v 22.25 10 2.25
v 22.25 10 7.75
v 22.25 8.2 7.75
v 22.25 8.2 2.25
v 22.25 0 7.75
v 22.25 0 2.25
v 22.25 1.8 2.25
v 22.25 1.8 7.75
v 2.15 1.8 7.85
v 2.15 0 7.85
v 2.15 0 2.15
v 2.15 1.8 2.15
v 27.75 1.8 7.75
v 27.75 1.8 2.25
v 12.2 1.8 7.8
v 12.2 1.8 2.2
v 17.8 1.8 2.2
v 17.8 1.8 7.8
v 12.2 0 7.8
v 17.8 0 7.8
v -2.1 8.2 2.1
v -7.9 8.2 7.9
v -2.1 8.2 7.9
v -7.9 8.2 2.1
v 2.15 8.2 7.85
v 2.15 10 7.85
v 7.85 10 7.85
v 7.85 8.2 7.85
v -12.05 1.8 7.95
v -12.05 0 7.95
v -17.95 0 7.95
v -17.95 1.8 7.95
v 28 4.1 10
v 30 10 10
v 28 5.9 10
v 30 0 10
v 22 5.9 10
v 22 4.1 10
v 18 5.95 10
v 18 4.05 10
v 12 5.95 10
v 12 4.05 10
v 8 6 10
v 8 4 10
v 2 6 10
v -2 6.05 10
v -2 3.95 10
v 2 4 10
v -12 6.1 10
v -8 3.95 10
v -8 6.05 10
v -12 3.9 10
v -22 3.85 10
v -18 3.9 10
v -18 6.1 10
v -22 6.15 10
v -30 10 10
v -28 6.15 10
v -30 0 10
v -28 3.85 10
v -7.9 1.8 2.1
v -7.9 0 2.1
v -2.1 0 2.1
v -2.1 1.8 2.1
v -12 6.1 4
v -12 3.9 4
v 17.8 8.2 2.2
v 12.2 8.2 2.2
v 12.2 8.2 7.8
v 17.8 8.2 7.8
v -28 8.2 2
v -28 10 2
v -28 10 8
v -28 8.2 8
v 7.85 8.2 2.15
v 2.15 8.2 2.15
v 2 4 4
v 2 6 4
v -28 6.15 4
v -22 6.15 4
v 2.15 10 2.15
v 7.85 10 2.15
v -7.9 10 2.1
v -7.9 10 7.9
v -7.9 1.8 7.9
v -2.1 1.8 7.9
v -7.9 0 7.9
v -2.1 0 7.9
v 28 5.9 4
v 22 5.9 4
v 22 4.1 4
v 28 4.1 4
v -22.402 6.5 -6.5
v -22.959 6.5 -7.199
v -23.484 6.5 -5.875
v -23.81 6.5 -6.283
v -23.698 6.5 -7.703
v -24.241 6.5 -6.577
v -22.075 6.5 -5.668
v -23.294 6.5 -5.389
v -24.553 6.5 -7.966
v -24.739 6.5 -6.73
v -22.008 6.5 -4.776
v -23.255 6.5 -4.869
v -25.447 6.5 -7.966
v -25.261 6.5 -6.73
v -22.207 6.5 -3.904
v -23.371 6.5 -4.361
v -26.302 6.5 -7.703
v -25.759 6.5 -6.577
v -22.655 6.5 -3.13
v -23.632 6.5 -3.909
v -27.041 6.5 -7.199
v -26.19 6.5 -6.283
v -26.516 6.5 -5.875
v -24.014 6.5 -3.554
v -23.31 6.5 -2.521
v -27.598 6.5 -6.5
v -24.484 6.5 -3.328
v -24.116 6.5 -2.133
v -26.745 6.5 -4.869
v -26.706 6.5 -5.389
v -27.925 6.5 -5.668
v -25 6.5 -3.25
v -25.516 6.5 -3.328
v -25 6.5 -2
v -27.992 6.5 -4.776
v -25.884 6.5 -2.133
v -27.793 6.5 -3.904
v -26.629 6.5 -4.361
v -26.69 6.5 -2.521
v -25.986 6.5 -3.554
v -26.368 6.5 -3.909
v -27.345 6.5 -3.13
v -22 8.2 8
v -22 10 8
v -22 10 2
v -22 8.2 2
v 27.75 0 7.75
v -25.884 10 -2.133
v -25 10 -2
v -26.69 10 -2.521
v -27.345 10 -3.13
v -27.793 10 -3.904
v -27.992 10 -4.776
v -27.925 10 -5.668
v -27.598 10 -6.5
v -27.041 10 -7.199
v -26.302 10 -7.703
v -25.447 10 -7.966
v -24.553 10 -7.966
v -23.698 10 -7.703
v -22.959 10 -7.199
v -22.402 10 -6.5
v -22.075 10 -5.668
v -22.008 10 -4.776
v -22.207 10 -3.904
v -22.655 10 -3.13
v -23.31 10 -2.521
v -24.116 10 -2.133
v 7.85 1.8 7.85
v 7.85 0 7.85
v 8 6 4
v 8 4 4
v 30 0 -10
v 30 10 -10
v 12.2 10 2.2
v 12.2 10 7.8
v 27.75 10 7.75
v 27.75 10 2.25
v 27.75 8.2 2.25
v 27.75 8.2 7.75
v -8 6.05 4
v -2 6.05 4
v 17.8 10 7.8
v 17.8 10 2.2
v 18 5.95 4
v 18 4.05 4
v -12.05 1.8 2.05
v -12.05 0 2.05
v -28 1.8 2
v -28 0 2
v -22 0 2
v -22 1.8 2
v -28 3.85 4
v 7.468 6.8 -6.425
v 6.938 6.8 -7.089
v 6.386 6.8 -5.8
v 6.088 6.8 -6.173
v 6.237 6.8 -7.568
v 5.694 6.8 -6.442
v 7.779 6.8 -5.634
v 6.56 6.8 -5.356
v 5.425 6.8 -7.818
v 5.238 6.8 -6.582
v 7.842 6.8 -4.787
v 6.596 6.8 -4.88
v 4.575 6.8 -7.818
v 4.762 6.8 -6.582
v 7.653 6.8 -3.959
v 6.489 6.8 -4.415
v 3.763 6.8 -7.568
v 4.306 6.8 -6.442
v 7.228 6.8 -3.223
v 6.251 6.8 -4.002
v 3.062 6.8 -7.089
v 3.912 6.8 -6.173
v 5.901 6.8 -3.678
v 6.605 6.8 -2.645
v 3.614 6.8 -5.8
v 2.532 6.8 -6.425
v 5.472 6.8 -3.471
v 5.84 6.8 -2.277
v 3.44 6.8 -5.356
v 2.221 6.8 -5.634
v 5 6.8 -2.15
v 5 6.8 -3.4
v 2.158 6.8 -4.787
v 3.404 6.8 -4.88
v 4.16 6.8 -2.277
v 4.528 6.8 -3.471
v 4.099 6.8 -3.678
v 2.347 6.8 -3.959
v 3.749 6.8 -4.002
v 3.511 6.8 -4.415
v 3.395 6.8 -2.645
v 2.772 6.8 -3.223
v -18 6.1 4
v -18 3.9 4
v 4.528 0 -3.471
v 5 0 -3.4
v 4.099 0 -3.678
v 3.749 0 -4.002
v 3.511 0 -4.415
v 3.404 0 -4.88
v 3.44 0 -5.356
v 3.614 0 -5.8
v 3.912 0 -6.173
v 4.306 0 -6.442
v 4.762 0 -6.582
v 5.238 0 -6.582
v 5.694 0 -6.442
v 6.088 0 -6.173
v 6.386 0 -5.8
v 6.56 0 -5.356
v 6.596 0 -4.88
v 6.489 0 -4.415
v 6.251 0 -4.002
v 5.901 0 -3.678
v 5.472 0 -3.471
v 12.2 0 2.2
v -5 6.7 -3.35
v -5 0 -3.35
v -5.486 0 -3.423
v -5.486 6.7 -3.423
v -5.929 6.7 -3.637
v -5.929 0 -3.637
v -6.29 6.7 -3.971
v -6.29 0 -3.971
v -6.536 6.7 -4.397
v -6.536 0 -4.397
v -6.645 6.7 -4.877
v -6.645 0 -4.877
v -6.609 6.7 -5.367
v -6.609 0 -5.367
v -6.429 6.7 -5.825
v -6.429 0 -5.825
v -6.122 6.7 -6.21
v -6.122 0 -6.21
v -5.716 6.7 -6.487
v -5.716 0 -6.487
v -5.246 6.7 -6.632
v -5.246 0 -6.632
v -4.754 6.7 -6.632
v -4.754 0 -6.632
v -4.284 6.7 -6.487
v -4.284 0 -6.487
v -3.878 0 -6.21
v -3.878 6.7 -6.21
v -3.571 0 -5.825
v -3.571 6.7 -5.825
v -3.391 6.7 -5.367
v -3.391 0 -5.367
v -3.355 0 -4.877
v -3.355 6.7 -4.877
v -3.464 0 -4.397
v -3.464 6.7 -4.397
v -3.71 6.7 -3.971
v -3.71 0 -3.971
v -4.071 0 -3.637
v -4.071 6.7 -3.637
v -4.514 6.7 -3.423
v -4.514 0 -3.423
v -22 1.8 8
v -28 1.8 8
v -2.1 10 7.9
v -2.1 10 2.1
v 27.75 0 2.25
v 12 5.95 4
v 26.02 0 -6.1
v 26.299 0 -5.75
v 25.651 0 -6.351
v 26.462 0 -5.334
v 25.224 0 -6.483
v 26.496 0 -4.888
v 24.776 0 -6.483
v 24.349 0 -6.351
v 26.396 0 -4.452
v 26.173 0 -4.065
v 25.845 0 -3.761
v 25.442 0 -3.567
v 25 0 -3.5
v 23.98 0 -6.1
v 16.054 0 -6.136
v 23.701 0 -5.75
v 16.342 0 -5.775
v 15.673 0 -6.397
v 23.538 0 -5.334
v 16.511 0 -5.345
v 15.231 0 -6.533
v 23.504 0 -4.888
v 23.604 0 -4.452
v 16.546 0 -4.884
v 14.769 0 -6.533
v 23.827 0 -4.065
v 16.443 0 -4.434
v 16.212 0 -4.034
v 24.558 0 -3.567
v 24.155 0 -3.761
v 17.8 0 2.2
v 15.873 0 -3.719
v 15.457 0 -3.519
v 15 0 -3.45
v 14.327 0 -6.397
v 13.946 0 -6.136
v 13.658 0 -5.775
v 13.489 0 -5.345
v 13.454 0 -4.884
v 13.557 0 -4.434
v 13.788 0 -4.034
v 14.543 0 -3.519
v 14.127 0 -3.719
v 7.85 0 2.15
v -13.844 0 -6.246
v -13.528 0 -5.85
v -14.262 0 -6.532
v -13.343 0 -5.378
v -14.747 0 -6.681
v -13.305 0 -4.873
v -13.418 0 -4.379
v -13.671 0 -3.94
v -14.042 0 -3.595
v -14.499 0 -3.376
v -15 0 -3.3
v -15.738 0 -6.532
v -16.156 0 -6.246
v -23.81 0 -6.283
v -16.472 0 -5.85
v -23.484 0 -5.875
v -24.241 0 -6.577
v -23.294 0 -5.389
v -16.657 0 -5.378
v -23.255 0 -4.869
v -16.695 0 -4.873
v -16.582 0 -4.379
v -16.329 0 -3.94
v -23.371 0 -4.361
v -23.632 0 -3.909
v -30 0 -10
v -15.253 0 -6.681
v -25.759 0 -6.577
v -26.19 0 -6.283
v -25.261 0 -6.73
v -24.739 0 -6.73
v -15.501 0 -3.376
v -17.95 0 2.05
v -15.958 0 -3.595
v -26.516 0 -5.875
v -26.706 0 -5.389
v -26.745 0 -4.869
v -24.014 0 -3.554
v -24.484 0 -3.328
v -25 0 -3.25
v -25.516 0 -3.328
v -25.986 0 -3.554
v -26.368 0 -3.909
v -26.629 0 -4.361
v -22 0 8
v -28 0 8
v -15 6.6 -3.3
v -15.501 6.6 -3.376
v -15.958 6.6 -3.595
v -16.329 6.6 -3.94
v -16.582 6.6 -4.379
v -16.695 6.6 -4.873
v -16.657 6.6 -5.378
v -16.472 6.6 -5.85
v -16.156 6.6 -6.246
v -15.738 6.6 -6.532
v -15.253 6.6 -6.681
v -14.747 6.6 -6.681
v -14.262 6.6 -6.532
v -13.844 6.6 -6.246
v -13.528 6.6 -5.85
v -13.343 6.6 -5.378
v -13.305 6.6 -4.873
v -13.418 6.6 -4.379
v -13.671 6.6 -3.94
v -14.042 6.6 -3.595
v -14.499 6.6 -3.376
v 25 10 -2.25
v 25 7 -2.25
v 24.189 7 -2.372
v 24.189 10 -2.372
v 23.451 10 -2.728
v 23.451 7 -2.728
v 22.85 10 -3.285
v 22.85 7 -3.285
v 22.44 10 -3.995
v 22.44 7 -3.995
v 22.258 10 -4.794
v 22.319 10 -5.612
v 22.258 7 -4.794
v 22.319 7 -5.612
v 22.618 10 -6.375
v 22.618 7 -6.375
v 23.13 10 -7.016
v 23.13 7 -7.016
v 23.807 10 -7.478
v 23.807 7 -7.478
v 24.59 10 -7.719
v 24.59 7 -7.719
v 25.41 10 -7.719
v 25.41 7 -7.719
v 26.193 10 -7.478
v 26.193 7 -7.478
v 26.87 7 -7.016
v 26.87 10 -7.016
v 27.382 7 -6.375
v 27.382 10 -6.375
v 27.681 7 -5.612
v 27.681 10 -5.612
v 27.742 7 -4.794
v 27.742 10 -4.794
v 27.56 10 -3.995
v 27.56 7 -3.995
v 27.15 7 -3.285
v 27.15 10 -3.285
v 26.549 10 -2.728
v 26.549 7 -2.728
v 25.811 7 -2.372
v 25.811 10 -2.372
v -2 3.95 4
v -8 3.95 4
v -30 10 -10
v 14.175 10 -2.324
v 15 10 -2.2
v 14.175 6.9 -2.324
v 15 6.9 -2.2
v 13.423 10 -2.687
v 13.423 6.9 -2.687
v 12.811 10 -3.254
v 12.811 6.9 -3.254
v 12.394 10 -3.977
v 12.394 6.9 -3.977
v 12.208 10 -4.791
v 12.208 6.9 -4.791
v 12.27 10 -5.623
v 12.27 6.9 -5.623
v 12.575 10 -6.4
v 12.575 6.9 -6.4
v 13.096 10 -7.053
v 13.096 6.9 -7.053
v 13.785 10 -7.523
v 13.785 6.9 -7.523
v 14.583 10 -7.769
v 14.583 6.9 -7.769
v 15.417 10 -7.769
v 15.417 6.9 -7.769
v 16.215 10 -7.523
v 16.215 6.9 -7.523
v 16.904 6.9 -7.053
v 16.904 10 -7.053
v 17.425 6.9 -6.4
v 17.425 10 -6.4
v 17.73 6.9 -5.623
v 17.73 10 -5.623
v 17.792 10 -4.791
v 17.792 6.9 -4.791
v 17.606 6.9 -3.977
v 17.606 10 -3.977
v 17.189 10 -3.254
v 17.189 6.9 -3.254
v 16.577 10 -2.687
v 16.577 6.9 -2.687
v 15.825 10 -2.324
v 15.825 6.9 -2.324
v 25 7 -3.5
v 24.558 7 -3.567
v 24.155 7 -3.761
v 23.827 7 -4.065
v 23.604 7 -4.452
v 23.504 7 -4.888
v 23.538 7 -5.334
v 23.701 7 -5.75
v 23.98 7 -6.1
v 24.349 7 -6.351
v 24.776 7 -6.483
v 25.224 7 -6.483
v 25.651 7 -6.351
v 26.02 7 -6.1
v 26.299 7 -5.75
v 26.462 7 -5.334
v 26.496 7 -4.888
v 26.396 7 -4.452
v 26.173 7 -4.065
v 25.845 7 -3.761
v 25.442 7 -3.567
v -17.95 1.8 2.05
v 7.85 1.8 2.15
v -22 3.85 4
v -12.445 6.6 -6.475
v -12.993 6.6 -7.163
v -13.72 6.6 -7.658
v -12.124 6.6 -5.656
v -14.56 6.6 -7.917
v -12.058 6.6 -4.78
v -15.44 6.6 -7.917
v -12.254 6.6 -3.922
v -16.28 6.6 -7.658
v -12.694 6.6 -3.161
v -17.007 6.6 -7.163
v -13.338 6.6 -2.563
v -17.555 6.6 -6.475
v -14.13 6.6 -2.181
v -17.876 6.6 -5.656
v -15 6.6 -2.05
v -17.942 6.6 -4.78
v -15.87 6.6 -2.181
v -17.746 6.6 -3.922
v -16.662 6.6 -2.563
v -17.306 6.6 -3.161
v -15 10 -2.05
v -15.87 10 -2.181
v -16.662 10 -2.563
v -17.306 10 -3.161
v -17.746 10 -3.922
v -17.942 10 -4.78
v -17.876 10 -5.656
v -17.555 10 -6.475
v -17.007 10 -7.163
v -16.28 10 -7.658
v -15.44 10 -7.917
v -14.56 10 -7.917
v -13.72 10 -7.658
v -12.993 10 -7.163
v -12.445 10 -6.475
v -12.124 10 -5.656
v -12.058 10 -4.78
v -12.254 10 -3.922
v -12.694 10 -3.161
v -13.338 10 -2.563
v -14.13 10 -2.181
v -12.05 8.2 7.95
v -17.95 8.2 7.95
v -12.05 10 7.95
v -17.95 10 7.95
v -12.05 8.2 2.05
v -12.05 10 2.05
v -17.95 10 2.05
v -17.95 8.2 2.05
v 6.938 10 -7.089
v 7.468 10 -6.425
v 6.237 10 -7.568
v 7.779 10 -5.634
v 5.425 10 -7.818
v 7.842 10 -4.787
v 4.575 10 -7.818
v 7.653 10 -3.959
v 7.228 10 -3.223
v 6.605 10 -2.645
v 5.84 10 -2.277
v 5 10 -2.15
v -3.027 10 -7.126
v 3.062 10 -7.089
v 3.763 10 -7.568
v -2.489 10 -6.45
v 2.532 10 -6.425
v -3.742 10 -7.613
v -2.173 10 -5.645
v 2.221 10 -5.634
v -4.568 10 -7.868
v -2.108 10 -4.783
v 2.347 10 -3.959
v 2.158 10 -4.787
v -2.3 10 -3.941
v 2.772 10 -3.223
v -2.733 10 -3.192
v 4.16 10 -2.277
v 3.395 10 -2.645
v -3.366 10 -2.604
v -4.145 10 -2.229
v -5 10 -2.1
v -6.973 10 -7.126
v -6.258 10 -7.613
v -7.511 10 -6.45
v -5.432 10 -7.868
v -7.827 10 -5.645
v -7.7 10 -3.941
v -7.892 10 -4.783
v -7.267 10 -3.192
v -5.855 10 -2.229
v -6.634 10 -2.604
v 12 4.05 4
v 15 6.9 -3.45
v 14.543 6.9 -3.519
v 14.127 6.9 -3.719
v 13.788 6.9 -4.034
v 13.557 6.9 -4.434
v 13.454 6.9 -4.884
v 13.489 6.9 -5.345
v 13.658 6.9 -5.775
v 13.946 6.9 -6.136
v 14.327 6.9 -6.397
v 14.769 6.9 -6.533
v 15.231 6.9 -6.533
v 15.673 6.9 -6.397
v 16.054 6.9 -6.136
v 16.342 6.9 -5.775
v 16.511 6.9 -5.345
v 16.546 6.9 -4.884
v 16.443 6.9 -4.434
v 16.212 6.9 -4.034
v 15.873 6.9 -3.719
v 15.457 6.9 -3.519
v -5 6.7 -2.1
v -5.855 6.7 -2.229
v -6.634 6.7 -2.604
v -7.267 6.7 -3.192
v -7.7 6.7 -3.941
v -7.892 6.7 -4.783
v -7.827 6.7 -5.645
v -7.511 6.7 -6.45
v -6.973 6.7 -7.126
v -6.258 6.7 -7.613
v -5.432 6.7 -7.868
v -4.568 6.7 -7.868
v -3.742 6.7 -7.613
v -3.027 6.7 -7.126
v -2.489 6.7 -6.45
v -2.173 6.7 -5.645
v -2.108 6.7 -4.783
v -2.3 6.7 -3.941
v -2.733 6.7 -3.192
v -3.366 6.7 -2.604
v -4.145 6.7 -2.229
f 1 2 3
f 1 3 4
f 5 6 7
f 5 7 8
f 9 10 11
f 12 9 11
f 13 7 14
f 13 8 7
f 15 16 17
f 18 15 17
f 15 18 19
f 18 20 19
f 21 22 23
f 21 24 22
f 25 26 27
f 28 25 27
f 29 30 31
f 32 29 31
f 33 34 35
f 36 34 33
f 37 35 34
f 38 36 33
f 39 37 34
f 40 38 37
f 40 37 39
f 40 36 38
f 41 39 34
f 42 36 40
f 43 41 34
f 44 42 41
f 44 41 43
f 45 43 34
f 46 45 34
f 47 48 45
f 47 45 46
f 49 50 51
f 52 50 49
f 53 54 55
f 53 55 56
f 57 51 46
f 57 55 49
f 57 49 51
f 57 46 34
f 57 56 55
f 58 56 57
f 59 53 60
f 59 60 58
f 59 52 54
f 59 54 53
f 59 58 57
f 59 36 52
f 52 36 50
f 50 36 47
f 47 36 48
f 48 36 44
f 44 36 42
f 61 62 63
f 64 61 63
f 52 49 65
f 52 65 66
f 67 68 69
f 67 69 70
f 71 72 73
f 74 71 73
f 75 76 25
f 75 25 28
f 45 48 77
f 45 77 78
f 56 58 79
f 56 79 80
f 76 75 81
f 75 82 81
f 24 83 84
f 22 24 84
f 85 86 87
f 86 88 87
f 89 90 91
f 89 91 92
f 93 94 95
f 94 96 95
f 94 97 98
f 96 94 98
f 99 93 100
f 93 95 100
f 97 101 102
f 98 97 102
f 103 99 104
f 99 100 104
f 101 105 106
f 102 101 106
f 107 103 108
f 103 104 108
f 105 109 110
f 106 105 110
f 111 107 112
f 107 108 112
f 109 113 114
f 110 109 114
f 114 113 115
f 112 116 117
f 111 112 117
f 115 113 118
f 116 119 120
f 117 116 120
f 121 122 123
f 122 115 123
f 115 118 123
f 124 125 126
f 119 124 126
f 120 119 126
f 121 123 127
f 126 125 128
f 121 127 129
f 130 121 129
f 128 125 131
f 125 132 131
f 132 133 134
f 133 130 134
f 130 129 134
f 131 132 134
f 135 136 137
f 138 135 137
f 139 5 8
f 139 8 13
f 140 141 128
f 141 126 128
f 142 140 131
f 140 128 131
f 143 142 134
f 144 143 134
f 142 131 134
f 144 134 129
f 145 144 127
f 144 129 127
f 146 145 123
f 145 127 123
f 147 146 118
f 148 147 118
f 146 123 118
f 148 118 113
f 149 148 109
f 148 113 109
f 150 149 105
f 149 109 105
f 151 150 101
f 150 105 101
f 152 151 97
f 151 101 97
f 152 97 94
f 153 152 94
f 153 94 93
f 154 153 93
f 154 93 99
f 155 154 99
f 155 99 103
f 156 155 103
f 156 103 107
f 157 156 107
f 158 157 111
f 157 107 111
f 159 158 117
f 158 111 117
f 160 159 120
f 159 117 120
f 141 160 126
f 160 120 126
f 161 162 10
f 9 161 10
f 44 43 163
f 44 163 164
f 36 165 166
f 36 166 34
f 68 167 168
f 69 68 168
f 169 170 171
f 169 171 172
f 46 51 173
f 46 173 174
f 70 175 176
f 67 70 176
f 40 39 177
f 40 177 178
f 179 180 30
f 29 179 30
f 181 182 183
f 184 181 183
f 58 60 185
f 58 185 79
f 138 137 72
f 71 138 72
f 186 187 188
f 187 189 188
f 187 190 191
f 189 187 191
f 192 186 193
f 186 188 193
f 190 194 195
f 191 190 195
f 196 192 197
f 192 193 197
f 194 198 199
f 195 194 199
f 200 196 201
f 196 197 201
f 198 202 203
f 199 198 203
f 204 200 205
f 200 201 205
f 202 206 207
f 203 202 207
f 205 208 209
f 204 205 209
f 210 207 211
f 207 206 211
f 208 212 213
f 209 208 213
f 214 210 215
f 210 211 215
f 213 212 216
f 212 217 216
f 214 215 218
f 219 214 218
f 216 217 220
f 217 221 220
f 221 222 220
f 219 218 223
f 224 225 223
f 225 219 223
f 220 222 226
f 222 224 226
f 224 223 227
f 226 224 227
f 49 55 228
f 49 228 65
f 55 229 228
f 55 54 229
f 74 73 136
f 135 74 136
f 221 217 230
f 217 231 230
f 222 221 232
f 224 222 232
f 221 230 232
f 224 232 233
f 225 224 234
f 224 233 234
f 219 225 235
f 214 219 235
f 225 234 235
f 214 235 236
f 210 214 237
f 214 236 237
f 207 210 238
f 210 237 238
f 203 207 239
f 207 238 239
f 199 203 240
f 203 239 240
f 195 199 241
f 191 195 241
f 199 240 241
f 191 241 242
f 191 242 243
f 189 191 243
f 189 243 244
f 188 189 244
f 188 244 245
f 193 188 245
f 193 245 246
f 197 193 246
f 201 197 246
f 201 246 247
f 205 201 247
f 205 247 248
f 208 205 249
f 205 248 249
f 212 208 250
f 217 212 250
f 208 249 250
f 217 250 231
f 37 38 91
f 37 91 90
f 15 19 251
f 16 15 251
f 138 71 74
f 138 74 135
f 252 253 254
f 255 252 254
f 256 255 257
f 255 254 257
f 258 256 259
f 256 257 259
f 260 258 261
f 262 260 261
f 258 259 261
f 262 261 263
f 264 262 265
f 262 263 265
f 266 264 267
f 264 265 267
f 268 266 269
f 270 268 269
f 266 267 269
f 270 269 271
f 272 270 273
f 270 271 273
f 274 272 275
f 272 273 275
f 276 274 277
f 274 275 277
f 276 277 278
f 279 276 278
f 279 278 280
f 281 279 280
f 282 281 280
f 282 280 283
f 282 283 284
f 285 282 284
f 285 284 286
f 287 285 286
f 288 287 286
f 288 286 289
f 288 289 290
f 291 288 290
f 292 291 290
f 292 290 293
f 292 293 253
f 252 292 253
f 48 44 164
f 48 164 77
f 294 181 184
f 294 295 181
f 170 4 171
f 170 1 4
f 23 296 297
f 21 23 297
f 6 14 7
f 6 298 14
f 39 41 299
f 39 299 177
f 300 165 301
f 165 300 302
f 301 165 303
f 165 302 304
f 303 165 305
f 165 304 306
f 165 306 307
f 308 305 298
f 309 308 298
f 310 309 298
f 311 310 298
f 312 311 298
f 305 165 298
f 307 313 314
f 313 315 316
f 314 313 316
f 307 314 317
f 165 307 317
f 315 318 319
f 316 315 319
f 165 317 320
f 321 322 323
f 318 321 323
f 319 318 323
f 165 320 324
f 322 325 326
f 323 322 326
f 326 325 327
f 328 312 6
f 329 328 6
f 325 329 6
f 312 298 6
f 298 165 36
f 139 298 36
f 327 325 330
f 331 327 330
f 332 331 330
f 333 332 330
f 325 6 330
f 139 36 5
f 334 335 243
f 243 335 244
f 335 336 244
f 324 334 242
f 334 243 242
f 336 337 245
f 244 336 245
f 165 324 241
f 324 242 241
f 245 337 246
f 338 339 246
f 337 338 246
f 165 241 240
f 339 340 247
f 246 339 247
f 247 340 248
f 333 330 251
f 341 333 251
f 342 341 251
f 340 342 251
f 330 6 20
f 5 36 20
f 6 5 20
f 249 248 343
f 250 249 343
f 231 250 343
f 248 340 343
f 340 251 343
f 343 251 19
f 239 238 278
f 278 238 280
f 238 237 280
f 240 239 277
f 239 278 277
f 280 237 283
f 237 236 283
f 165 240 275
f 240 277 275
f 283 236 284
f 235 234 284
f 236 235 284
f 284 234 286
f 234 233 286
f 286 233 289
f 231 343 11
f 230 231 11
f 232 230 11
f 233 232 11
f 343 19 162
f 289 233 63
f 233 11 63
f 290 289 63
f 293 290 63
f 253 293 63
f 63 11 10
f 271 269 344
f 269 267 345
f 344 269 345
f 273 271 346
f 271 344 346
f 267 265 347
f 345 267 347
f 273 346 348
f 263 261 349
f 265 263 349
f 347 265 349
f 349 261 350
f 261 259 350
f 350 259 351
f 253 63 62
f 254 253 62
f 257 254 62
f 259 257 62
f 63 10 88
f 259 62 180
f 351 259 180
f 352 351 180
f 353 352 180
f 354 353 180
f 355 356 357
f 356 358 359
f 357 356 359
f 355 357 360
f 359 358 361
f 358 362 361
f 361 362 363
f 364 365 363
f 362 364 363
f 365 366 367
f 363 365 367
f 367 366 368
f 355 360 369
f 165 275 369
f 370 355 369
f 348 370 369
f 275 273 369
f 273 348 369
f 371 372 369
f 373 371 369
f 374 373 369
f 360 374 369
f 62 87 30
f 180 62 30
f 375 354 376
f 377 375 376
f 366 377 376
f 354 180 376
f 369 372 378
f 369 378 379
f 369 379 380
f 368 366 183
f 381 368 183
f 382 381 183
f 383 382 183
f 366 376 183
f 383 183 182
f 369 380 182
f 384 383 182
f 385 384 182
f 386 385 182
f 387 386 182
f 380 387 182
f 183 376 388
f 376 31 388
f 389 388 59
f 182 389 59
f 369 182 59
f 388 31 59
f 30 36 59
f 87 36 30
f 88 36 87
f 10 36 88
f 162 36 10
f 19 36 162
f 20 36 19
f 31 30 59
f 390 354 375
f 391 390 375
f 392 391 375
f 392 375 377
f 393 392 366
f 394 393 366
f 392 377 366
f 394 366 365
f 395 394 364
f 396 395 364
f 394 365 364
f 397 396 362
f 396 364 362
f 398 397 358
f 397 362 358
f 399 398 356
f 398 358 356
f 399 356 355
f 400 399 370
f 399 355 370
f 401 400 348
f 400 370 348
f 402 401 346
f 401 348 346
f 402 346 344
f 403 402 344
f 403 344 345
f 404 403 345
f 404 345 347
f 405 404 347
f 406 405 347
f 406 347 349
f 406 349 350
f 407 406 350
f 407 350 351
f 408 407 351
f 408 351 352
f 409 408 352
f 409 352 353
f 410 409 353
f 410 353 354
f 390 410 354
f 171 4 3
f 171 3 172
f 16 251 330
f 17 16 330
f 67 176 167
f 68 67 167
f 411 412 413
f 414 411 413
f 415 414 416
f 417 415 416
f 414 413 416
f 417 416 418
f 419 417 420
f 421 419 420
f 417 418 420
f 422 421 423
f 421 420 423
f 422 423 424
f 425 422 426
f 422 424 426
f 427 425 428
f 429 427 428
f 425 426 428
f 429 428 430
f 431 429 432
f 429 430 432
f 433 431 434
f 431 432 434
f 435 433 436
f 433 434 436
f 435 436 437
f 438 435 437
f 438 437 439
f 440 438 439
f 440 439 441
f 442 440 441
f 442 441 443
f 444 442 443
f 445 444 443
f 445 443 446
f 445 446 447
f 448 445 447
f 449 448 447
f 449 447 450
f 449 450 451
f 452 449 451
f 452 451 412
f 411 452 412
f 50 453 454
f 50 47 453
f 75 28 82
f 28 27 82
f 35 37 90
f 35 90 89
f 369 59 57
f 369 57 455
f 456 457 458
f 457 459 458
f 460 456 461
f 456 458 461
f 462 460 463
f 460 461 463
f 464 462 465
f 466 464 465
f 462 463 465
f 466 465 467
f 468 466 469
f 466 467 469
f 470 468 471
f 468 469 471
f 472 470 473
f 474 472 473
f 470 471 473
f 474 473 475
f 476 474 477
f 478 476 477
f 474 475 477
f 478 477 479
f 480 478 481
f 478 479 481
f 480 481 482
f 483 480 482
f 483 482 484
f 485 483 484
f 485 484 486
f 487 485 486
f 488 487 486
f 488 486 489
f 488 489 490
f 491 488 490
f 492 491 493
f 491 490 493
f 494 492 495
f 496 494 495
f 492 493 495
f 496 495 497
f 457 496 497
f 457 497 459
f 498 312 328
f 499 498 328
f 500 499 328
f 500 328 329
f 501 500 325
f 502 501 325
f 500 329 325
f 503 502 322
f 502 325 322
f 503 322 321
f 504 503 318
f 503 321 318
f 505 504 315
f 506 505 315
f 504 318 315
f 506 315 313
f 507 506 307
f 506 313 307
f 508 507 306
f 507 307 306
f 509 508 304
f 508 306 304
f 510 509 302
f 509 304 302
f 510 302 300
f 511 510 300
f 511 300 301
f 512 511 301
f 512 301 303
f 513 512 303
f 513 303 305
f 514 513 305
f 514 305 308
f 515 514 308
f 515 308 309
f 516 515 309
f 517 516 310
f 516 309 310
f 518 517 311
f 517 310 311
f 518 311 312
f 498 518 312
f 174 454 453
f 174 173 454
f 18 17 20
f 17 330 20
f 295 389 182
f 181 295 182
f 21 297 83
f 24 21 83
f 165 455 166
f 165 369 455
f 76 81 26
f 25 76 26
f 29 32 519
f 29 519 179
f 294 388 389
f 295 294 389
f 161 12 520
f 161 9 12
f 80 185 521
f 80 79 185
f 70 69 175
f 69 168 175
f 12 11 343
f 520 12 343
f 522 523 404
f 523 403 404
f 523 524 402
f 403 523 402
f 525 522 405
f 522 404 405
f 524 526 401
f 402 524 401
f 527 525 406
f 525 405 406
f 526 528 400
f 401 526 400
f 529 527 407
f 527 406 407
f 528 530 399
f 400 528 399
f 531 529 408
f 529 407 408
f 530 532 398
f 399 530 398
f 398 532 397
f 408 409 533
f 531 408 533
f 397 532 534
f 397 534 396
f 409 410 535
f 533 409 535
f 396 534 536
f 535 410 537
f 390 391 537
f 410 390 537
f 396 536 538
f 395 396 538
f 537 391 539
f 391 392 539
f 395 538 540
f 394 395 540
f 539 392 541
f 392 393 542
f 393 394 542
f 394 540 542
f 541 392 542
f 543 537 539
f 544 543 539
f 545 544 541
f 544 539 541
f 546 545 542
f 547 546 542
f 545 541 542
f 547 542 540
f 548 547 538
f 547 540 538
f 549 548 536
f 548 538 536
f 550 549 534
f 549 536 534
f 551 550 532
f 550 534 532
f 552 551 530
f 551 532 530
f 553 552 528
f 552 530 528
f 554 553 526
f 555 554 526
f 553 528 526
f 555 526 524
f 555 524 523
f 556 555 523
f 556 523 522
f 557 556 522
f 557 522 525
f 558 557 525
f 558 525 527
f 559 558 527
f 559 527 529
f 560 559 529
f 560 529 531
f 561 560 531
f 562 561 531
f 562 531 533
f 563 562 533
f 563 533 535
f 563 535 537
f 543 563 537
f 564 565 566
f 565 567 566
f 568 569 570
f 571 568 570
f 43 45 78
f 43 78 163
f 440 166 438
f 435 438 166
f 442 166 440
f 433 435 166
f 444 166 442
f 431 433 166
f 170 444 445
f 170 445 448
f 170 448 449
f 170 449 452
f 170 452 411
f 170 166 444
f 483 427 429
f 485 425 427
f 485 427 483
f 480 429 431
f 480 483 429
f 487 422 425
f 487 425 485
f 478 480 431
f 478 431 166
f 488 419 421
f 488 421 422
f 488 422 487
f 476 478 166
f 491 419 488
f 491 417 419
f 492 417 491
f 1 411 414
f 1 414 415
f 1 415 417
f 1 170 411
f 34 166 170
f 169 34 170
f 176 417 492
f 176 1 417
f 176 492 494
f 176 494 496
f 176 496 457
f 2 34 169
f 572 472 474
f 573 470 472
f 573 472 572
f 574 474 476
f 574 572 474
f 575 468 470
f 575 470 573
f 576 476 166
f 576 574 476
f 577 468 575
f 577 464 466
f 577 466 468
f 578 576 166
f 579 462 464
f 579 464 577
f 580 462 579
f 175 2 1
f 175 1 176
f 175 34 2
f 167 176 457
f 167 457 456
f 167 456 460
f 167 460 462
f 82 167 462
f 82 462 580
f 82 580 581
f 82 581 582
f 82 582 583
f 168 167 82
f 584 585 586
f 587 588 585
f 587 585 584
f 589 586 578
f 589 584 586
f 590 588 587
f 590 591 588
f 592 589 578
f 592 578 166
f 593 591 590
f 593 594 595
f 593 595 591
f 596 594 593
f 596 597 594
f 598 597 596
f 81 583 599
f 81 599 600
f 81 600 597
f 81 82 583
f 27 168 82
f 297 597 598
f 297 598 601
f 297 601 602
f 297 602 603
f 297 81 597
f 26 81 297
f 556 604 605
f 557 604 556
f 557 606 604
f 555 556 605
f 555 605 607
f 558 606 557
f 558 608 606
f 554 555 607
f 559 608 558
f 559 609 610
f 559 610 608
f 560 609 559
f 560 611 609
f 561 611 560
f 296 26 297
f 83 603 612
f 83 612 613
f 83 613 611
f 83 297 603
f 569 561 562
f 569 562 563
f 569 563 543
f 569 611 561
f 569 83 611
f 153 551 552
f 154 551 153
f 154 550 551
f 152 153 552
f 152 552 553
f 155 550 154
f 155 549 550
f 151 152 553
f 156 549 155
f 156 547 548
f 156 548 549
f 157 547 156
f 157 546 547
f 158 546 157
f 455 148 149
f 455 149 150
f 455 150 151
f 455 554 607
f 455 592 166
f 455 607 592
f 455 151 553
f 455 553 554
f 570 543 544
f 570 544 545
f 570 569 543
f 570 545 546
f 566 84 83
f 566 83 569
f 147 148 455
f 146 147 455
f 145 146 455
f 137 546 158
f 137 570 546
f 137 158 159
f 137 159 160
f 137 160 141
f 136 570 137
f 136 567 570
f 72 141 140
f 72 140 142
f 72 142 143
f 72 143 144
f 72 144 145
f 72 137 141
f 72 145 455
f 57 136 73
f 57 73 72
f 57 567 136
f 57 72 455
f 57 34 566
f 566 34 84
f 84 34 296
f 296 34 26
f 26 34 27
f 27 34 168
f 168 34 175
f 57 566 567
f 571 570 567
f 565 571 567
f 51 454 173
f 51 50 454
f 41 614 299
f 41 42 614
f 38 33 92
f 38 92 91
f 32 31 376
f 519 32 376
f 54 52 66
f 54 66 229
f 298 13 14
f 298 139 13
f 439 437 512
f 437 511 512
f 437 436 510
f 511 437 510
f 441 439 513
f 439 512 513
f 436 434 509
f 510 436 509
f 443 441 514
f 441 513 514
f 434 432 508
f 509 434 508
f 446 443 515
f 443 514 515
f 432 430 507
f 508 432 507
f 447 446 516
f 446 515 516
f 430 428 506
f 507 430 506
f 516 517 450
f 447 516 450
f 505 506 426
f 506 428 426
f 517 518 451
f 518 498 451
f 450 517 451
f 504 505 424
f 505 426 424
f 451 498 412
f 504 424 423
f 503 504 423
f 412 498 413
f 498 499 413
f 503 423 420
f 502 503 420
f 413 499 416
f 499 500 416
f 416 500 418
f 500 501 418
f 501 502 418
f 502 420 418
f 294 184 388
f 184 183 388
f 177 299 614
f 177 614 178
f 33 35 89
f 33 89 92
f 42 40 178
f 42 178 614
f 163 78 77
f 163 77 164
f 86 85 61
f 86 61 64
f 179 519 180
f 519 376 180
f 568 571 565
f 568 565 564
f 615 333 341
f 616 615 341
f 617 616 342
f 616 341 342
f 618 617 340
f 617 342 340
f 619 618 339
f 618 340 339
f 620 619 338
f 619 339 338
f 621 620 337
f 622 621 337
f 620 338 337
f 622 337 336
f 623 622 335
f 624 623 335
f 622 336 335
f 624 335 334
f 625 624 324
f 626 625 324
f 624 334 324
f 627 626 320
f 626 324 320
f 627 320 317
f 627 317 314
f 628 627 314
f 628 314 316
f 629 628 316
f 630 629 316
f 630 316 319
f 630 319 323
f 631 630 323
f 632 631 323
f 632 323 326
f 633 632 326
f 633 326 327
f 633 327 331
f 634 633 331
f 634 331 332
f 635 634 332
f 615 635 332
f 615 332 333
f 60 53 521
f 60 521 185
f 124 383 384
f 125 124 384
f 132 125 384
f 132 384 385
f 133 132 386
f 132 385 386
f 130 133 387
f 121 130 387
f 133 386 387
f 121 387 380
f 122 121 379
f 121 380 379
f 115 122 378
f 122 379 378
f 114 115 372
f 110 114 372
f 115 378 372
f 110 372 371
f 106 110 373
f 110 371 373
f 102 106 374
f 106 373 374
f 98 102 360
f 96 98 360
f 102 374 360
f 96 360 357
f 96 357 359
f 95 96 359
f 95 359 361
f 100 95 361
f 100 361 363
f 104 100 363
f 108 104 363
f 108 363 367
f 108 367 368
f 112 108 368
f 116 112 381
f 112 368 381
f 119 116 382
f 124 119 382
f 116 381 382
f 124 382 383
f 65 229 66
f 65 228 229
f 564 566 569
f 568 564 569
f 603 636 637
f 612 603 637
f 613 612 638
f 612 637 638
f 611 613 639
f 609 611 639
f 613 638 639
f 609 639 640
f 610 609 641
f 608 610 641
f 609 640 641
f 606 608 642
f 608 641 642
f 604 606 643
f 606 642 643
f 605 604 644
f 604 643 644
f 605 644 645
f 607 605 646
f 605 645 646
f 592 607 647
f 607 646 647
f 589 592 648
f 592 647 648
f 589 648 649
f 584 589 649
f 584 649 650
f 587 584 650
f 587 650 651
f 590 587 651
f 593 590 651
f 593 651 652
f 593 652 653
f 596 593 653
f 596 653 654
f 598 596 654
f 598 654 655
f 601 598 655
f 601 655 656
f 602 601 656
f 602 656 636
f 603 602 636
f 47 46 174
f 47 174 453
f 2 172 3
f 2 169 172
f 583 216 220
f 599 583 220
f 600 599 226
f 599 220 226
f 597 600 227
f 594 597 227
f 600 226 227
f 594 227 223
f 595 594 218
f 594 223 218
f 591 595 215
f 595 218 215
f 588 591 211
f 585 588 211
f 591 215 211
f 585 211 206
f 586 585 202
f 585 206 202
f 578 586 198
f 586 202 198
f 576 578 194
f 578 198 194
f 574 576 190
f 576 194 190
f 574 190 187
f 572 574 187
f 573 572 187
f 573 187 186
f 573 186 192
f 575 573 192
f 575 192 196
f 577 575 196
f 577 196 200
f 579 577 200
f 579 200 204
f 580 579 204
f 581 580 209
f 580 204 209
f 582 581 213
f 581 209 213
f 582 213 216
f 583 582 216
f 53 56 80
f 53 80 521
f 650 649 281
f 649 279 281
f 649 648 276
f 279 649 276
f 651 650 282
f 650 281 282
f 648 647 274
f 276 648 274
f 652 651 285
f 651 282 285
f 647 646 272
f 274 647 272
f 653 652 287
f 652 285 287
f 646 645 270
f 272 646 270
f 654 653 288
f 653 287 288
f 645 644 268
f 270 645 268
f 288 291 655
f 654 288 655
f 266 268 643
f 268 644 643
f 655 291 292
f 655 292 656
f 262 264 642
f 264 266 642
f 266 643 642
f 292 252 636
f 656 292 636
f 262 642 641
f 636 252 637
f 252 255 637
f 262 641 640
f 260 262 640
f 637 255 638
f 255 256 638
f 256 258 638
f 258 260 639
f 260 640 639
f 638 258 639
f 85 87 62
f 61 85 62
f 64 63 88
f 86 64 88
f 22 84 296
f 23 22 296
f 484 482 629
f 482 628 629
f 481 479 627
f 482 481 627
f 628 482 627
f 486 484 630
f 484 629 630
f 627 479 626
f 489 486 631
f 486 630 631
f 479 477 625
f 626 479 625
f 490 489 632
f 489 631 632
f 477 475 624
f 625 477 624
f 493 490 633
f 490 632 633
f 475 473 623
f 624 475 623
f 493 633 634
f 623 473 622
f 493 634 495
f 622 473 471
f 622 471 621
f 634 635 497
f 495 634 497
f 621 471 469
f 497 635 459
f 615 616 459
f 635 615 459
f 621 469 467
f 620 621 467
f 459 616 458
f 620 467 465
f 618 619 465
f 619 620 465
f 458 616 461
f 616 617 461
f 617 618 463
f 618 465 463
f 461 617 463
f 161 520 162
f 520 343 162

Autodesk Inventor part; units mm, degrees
ref_plane "YZ Plane" through (0, 0, 0) normal (1, 0, 0) x (0, 1, 0)
ref_plane "XZ Plane" through (0, 0, 0) normal (0, 1, 0) x (-1, 0, 0)
ref_plane "XY Plane" through (0, 0, 0) normal (0, 0, 1) x (1, 0, 0)
sketch "Sketch1" plane through (0, 0, 0) normal (0, 1, 0) x (-1, 0, 0)
  line L0 (-30, 10) -> (30, 10)
  line L1 (30, 10) -> (30, -10)
  line L2 (30, -10) -> (-30, -10)
  line L3 (-30, -10) -> (-30, 10)
  point P0 (0, 0)
  point P1 (30, 0)
  point P2 (0, 10)
  dimension "d0" = 60
  dimension "d1" = 20
extrude "Extrusion1" add sketch "Sketch1" along normal blind 10
sketch "Sketch2" plane through (0, 10, 0) normal (0, 1, 0) x (1, 0, 0)
  line L0 (27.75, -7.75) -> (22.25, -7.75)
  line L1 (22.25, -7.75) -> (22.25, -2.25)
  line L2 (22.25, -2.25) -> (27.75, -2.25)
  line L3 (27.75, -2.25) -> (27.75, -7.75)
  line L4 (30, -10) -> (30, 10) projected
  line L5 (-30, -10) -> (30, -10) projected
  line L6 (12.2, -7.8) -> (17.8, -7.8)
  line L7 (17.8, -7.8) -> (17.8, -2.2)
  line L8 (17.8, -2.2) -> (12.2, -2.2)
  line L9 (12.2, -2.2) -> (12.2, -7.8)
  line L10 (2.15, -7.85) -> (7.85, -7.85)
  line L11 (7.85, -7.85) -> (7.85, -2.15)
  line L12 (7.85, -2.15) -> (2.15, -2.15)
  line L13 (2.15, -2.15) -> (2.15, -7.85)
  line L14 (-7.9, -7.9) -> (-2.1, -7.9)
  line L15 (-2.1, -7.9) -> (-2.1, -2.1)
  line L16 (-2.1, -2.1) -> (-7.9, -2.1)
  line L17 (-7.9, -2.1) -> (-7.9, -7.9)
  line L18 (-17.95, -7.95) -> (-12.05, -7.95)
  line L19 (-12.05, -7.95) -> (-12.05, -2.05)
  line L20 (-12.05, -2.05) -> (-17.95, -2.05)
  line L21 (-17.95, -2.05) -> (-17.95, -7.95)
  line L22 (-28, -8) -> (-22, -8)
  line L23 (-22, -8) -> (-22, -2)
  line L24 (-22, -2) -> (-28, -2)
  line L25 (-28, -2) -> (-28, -8)
  point P0 (0, 0)
  point P1 (-12.05, -5)
  point P2 (-7.9, -5)
  point P3 (-2.1, -5)
  point P4 (2.15, -5)
  point P5 (7.85, -5)
  point P6 (12.2, -5)
  point P7 (17.8, -5)
  point P8 (22.25, -5)
  point P9 (15, -7.8)
  point P10 (25, -7.75)
  point P11 (5, -7.85)
  point P12 (-5, -7.9)
  point P13 (-15, -7.95)
  point P14 (-25, -8)
  point P15 (-22, -5)
  point P16 (-17.95, -5)
  dimension "d9" = 5.5
  dimension "d10" = 5.6
  dimension "d11" = 5.7
  dimension "d12" = 5.8
  dimension "d13" = 5.9
  dimension "d14" = 10
  dimension "d15" = 10
  dimension "d16" = 10
  dimension "d17" = 10
  dimension "d18" = 5
  dimension "d19" = 6
  dimension "d20" = 10
  dimension "d65" = 5
extrude "Extrusion2" cut sketch "Sketch2" against normal blind 1.8
sketch "Sketch3" plane through (-30, 0, 10) normal (0, 0, 1) x (1, 0, 0)
  line L0 (2, 6.15) -> (8, 6.15)
  line L1 (8, 6.15) -> (8, 3.85)
  line L2 (8, 3.85) -> (2, 3.85)
  line L3 (2, 3.85) -> (2, 6.15)
  line L4 (12, 6.1) -> (18, 6.1)
  line L5 (18, 6.1) -> (18, 3.9)
  line L6 (18, 3.9) -> (12, 3.9)
  line L7 (12, 3.9) -> (12, 6.1)
  line L8 (22, 6.05) -> (28, 6.05)
  line L9 (28, 6.05) -> (28, 3.95)
  line L10 (28, 3.95) -> (22, 3.95)
  line L11 (22, 3.95) -> (22, 6.05)
  line L12 (32, 6) -> (38, 6)
  line L13 (38, 6) -> (38, 4)
  line L14 (38, 4) -> (32, 4)
  line L15 (32, 4) -> (32, 6)
  line L16 (42, 5.95) -> (48, 5.95)
  line L17 (48, 5.95) -> (48, 4.05)
  line L18 (48, 4.05) -> (42, 4.05)
  line L19 (42, 4.05) -> (42, 5.95)
  line L20 (52, 5.9) -> (58, 5.9)
  line L21 (58, 5.9) -> (58, 4.1)
  line L22 (58, 4.1) -> (52, 4.1)
  line L23 (52, 4.1) -> (52, 5.9)
  line L24 (60, 0) -> (60, 10) projected
  point P0 (30, 0)
  point P1 (55, 5.9)
  point P2 (45, 5.95)
  point P3 (35, 6)
  point P4 (25, 6.05)
  point P5 (15, 6.1)
  point P6 (5, 6.15)
  point P7 (8, 5)
  point P8 (12, 5)
  point P9 (18, 5)
  point P10 (22, 5)
  point P11 (28, 5)
  point P12 (32, 5)
  point P13 (38, 5)
  point P14 (42, 5)
  point P15 (48, 5)
  point P16 (52, 5)
  point P17 (58, 5)
  point P18 (60, 5)
  dimension "d23" = 6
  dimension "d24" = 1.8
  dimension "d25" = 5
  dimension "d26" = 10
  dimension "d27" = 10
  dimension "d28" = 10
  dimension "d29" = 10
  dimension "d30" = 10
  dimension "d31" = 1.9
  dimension "d32" = 2
  dimension "d33" = 2.1
  dimension "d34" = 2.2
  dimension "d35" = 2.3
extrude "Extrusion3" cut sketch "Sketch3" against normal blind 6
sketch "Sketch4" plane through (0, 0, 0) normal (0, -1, 0) x (1, 0, 0)
  line L0 (27.75, 2.25) -> (22.25, 2.25)
  line L1 (22.25, 2.25) -> (22.25, 7.75)
  line L2 (22.25, 7.75) -> (27.75, 7.75)
  line L3 (27.75, 7.75) -> (27.75, 2.25)
  line L4 (12.2, 2.2) -> (17.8, 2.2)
  line L5 (17.8, 2.2) -> (17.8, 7.8)
  line L6 (17.8, 7.8) -> (12.2, 7.8)
  line L7 (12.2, 7.8) -> (12.2, 2.2)
  line L8 (2.15, 2.15) -> (7.85, 2.15)
  line L9 (7.85, 2.15) -> (7.85, 7.85)
  line L10 (7.85, 7.85) -> (2.15, 7.85)
  line L11 (2.15, 7.85) -> (2.15, 2.15)
  line L12 (-7.9, 2.1) -> (-2.1, 2.1)
  line L13 (-2.1, 2.1) -> (-2.1, 7.9)
  line L14 (-2.1, 7.9) -> (-7.9, 7.9)
  line L15 (-7.9, 7.9) -> (-7.9, 2.1)
  line L16 (-17.95, 2.05) -> (-12.05, 2.05)
  line L17 (-12.05, 2.05) -> (-12.05, 7.95)
  line L18 (-12.05, 7.95) -> (-17.95, 7.95)
  line L19 (-17.95, 7.95) -> (-17.95, 2.05)
  line L20 (-28, 2) -> (-22, 2)
  line L21 (-22, 2) -> (-22, 8)
  line L22 (-22, 8) -> (-28, 8)
  line L23 (-28, 8) -> (-28, 2)
  line L24 (30, 10) -> (-30, 10) projected
  line L25 (30, -10) -> (30, 10) projected
  point P0 (0, 0)
  point P1 (-12.05, 5)
  point P2 (-7.9, 5)
  point P3 (-2.1, 5)
  point P4 (2.15, 5)
  point P5 (7.85, 5)
  point P6 (12.2, 5)
  point P7 (17.8, 5)
  point P8 (22.25, 5)
  point P9 (15, 2.2)
  point P10 (25, 2.25)
  point P11 (5, 2.15)
  point P12 (-5, 2.1)
  point P13 (-15, 2.05)
  point P14 (-25, 2)
  point P15 (-22, 5)
  point P16 (-17.95, 5)
  dimension "d38" = 5.5
  dimension "d39" = 5.6
  dimension "d40" = 5.7
  dimension "d41" = 5.8
  dimension "d42" = 5.9
  dimension "d43" = 10
  dimension "d44" = 10
  dimension "d45" = 10
  dimension "d46" = 10
  dimension "d47" = 6
  dimension "d48" = 10
  dimension "d51" = 5
  dimension "d53" = 5
extrude "Extrusion4" cut sketch "Sketch4" against normal blind 1.8
hole "Hole1" at (25, 10, -5) direction (0, -1, 0) diameter 3 end through all counterbore diameter 5.5 counterbore depth 3
hole "Hole2" at (15, 10, -5) direction (0, -1, 0) diameter 3.1 end through all counterbore diameter 5.6 counterbore depth 3.1
hole "Hole3" at (5, 10, -5) direction (0, -1, 0) diameter 3.2 end through all counterbore diameter 5.7 counterbore depth 3.2
hole "Hole4" at (-5, 10, -5) direction (0, -1, 0) diameter 3.3 end through all counterbore diameter 5.8 counterbore depth 3.3
hole "Hole5" at (-15, 10, -5) direction (0, -1, 0) diameter 3.4 end through all counterbore diameter 5.9 counterbore depth 3.4
hole "Hole6" at (-25, 10, -5) direction (0, -1, 0) diameter 3.5 end through all counterbore diameter 6 counterbore depth 3.5
equation "\"d9\" = nut_A"
equation "\"d21\" = nut_B"
equation "\"d24\" = nut_B"
equation "\"d38\" = d49"
equation "\"d54\" = nut_B"
equation "\"d58\" = screw_m3_A"
equation "\"d60\" = screw_m3_C"
equation "\"d61\" = screw_m3_D"
equation "\"nut_A\" = 5.5"
equation "\"nut_B\" = 1.8"
equation "\"d49\" = 5.5"
equation "\"screw_m3_A\" = 3"
equation "\"screw_m3_C\" = 5.5"
equation "\"screw_m3_D\" = 3"
properties part number "TOLERANCE_TEST"
